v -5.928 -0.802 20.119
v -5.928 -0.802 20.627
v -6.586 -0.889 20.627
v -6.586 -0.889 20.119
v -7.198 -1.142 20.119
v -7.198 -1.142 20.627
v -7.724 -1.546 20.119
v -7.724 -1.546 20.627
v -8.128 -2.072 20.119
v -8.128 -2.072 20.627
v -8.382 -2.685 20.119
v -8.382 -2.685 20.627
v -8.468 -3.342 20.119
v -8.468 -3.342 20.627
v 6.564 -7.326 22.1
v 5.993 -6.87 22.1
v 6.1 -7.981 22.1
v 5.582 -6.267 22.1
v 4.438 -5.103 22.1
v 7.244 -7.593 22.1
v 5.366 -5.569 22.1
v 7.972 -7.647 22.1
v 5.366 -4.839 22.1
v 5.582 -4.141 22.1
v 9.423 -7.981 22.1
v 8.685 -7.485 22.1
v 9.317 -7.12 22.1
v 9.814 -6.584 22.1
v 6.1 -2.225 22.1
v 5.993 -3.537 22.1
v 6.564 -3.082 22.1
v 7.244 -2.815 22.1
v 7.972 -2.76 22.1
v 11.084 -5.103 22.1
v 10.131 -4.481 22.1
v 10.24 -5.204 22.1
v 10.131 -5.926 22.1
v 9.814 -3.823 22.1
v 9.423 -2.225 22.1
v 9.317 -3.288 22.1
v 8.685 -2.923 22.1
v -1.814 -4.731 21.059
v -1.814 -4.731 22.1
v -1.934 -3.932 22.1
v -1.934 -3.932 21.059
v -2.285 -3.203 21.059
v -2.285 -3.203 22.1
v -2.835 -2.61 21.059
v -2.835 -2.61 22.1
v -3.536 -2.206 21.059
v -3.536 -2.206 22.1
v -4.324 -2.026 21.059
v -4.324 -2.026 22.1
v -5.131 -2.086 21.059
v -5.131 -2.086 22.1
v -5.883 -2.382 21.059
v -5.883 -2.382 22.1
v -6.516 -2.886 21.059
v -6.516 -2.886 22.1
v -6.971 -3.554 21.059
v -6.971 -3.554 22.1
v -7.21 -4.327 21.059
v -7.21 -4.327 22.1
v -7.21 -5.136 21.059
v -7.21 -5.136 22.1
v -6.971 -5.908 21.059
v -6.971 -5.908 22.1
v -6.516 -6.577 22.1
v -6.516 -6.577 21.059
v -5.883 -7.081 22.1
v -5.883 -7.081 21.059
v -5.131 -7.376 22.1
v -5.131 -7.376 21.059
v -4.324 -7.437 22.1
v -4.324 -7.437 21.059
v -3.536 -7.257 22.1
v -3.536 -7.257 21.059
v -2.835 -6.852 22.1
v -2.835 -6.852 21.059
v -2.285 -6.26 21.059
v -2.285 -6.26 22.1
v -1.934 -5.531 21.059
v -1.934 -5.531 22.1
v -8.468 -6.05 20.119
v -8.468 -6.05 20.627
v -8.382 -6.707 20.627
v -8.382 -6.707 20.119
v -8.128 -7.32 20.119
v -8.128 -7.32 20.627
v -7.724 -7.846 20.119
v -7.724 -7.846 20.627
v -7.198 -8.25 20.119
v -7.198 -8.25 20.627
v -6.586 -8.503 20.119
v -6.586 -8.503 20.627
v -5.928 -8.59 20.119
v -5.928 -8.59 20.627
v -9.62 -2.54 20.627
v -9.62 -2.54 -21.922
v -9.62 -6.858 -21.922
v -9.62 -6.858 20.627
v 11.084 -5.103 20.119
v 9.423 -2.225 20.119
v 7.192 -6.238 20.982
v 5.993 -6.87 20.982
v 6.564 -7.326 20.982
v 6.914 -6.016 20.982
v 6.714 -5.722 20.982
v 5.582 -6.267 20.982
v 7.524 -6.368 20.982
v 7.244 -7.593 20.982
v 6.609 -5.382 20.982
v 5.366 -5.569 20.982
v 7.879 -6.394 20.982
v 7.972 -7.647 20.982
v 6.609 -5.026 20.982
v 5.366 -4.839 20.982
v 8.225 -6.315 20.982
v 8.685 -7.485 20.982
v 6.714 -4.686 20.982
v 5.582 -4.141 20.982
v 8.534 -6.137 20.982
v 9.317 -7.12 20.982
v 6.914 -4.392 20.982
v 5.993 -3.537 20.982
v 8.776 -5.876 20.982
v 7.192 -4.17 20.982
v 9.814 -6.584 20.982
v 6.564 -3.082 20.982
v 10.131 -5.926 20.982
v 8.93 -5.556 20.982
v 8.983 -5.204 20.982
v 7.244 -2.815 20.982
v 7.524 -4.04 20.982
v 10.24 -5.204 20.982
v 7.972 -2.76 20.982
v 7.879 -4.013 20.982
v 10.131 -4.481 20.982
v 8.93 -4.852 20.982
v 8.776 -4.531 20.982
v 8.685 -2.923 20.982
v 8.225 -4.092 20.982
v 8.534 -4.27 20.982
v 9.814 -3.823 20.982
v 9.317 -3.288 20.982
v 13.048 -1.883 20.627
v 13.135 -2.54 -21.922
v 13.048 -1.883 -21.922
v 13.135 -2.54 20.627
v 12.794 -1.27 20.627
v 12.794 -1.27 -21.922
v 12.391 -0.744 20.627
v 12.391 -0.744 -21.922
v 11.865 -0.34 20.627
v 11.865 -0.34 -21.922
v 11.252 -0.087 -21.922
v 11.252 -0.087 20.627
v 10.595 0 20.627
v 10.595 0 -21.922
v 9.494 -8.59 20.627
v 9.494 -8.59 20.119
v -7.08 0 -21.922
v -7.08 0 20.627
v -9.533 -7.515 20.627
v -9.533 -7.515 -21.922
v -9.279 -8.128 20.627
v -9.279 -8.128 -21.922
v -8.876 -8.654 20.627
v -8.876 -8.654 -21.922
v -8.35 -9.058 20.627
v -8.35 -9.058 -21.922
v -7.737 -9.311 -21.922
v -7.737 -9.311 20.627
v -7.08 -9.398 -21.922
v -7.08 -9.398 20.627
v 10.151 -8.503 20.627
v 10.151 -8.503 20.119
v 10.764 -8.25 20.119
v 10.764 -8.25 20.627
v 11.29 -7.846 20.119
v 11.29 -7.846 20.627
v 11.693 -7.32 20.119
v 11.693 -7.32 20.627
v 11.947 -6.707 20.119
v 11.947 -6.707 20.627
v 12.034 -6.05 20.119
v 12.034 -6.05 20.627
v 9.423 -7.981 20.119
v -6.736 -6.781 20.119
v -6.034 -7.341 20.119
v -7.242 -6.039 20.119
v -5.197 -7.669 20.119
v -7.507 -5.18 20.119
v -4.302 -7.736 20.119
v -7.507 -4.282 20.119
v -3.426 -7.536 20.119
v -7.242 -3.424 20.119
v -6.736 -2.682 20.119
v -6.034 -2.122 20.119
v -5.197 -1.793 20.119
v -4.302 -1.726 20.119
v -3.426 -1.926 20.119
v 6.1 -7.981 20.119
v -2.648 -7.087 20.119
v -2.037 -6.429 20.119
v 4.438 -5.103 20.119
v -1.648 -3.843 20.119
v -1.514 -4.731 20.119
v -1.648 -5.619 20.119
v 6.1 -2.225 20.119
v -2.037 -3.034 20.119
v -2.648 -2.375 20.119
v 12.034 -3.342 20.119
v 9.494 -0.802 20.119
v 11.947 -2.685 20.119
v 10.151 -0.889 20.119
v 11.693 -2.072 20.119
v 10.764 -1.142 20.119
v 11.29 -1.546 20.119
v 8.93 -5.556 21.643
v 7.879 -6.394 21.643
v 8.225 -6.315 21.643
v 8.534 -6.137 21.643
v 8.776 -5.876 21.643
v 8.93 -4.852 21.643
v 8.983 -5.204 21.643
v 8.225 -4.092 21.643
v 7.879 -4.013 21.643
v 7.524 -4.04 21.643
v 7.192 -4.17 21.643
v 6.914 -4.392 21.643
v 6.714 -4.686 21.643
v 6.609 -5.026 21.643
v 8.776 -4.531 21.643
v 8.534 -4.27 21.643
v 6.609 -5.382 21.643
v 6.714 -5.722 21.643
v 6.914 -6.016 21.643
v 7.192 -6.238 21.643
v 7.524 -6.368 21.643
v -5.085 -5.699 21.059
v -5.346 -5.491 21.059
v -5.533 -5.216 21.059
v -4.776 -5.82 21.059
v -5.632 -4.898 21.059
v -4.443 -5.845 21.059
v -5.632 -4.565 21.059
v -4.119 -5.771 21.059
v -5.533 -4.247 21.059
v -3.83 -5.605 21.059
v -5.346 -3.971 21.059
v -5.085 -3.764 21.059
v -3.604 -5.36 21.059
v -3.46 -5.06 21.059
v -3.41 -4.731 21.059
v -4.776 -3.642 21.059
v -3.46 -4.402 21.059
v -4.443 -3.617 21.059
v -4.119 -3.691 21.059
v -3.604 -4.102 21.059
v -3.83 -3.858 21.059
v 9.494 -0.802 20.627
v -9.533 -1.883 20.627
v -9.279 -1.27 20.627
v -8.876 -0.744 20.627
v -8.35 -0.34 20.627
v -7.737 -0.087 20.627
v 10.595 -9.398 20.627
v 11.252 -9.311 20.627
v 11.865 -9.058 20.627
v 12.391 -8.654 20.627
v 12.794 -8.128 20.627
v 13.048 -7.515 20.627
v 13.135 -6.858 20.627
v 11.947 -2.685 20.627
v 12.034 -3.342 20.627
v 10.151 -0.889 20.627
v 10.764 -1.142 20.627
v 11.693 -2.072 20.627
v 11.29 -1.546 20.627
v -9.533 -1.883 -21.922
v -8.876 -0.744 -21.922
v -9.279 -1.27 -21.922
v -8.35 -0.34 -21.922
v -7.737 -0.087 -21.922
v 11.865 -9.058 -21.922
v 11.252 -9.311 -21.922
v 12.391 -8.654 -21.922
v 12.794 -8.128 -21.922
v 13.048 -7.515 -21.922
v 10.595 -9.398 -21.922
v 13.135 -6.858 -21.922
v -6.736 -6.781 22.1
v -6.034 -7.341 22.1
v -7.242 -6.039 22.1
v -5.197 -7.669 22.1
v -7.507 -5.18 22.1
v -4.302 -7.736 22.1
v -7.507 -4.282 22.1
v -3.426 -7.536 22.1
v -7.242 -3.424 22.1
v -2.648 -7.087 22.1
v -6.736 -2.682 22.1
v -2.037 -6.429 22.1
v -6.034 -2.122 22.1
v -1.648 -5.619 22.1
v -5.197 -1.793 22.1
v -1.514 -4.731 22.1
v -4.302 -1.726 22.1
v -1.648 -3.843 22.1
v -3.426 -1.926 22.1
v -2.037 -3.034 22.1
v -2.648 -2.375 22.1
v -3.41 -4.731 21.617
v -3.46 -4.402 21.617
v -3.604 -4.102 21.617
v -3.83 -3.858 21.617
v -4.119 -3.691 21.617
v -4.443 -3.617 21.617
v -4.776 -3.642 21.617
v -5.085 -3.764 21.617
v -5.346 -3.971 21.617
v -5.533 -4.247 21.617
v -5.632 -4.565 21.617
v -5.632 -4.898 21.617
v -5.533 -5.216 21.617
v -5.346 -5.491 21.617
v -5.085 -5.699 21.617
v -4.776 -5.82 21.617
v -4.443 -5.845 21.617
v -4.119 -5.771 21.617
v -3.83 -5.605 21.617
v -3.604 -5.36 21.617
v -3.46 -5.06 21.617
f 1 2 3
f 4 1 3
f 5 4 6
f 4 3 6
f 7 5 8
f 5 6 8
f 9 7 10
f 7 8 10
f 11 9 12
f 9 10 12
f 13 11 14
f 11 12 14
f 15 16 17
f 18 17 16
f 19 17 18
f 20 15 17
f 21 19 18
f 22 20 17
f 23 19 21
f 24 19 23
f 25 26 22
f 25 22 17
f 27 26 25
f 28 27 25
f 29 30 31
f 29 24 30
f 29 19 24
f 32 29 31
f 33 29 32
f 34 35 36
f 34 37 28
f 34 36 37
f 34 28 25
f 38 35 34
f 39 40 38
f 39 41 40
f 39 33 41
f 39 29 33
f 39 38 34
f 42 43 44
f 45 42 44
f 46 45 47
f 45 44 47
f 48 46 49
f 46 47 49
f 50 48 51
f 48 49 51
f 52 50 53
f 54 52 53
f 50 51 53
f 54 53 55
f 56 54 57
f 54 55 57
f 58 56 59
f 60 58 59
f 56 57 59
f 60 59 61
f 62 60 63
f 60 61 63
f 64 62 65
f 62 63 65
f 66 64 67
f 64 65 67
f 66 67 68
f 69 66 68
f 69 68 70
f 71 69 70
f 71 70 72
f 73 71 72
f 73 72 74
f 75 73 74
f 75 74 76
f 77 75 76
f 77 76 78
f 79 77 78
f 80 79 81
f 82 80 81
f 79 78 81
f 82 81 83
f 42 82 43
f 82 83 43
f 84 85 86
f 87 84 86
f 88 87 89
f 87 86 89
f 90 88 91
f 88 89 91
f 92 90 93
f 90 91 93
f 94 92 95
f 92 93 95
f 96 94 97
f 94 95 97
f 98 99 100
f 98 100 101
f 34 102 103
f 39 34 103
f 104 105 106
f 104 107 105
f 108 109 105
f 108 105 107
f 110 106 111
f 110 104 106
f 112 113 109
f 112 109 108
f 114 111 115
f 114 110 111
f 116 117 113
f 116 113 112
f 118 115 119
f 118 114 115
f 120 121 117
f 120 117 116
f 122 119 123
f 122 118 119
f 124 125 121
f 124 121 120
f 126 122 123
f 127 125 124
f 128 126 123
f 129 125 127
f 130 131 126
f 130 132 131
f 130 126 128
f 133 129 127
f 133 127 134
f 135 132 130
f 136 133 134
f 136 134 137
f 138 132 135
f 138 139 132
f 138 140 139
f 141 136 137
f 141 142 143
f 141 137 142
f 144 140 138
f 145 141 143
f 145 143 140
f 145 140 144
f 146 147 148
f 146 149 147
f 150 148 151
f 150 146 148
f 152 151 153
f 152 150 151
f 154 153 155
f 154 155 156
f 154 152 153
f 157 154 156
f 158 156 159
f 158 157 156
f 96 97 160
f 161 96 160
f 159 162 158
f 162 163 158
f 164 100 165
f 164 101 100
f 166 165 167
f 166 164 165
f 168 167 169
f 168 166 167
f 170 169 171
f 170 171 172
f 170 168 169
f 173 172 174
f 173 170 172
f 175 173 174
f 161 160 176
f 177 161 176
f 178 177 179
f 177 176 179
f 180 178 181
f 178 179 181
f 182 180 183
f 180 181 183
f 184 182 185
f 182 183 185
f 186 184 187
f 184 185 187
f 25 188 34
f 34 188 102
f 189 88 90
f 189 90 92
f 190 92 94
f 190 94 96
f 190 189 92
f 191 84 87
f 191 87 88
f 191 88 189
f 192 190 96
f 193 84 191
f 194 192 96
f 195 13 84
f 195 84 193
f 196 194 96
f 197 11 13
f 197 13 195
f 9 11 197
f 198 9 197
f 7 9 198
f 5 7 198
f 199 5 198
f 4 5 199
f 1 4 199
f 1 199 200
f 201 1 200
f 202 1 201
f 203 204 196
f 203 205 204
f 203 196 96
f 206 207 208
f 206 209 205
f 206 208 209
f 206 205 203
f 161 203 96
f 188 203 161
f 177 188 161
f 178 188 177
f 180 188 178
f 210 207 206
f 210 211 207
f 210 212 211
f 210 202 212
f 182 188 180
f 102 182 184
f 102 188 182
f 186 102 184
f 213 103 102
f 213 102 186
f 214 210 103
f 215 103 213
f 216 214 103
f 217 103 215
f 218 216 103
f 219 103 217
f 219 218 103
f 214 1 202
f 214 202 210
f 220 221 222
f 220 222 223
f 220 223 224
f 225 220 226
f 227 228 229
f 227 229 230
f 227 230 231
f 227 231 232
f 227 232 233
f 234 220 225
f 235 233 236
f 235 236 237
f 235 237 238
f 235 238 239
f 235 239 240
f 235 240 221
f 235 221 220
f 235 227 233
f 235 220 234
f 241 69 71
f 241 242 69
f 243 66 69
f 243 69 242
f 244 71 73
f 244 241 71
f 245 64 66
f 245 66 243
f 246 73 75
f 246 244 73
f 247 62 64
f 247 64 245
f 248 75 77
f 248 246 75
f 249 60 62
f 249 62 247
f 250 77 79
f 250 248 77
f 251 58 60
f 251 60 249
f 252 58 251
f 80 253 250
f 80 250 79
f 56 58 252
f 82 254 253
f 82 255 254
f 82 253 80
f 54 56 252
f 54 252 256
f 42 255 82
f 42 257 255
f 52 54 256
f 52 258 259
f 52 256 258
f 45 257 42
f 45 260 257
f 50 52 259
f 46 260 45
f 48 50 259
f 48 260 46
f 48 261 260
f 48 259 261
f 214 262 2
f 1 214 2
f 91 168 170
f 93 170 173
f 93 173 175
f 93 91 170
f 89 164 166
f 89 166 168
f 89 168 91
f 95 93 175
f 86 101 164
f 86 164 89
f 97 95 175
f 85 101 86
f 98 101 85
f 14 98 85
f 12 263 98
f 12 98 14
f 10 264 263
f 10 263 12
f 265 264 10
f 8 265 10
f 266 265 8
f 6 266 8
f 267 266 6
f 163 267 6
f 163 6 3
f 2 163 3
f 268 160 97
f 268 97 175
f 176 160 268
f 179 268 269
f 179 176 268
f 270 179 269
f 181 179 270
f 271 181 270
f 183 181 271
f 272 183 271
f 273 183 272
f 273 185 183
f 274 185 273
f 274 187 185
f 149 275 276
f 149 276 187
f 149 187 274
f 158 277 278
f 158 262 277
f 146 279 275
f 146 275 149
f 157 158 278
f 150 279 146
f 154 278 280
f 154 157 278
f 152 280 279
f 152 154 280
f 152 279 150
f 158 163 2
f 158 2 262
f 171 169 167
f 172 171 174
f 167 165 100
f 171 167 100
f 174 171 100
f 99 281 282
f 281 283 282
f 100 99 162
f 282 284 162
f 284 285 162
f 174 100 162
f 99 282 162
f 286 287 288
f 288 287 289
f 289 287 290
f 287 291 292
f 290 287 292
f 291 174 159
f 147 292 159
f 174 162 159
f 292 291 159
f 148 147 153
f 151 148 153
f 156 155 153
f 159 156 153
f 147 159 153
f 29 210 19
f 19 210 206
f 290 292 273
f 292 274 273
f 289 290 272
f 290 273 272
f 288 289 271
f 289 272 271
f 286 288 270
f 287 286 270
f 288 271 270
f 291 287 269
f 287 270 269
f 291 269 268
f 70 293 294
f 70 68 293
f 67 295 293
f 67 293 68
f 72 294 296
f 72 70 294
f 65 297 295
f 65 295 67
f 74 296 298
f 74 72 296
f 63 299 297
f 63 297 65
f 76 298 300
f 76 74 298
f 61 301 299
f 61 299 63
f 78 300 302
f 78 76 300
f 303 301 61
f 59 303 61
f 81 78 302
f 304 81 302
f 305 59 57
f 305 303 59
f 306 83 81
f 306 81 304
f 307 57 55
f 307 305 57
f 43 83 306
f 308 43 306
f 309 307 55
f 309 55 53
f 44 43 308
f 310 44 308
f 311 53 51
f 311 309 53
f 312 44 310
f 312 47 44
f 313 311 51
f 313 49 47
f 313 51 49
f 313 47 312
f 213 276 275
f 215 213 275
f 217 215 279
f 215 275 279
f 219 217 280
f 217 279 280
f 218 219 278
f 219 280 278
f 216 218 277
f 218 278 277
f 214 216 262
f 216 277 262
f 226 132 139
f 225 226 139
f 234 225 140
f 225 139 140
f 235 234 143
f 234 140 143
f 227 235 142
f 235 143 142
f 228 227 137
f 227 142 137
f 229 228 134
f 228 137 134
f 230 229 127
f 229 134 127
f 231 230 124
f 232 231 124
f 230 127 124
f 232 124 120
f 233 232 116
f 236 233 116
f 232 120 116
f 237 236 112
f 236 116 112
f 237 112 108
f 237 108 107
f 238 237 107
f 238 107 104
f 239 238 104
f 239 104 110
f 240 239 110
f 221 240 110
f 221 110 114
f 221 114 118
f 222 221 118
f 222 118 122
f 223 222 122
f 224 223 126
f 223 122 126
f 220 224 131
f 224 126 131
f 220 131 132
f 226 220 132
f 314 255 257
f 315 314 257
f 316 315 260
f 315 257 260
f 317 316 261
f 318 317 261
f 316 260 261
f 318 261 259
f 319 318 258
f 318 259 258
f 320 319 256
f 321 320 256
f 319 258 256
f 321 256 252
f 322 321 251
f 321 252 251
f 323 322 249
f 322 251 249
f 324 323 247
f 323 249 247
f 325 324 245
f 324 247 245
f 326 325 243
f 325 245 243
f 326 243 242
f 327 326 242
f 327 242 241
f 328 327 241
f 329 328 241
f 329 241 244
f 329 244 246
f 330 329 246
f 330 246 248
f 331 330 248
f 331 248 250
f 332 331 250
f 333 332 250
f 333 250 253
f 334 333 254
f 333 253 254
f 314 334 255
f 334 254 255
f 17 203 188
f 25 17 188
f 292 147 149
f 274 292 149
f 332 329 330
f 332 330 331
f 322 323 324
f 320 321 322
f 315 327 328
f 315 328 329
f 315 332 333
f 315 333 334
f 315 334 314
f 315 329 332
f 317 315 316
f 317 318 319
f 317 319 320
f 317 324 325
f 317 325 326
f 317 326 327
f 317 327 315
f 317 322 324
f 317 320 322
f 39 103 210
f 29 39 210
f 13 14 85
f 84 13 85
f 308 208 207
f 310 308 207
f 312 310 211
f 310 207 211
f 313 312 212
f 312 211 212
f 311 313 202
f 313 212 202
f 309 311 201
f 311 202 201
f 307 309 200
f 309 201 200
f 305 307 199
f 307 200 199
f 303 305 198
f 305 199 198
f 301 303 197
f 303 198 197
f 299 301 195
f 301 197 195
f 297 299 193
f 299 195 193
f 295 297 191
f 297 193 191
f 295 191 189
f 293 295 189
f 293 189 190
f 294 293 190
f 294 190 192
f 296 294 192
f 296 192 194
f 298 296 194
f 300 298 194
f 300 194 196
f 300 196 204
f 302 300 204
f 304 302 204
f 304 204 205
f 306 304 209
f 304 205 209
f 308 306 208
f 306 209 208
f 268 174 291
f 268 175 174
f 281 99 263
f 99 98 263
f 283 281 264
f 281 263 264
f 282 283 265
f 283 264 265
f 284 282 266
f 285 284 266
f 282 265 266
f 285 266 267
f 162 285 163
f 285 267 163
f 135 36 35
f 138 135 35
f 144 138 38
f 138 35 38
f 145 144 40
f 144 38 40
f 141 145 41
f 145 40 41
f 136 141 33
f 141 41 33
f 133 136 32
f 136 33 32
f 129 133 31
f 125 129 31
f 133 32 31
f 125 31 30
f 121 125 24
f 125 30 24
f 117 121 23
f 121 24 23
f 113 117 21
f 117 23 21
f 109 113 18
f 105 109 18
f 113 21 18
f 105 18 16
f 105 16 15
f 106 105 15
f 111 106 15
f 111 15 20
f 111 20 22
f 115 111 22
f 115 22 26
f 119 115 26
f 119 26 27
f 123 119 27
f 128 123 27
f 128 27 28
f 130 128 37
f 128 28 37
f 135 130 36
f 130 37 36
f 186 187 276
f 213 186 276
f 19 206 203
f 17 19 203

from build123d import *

# Parameters (mm, degrees)
F0_W      = 22.75429
F0_H      = 42.548669
F1_DEPTH  = 9.398
F2_R      = 2.54
F4_DEPTH  = 0.508
F6_DEPTH  = 1.9812
F7_R      = 3.013325
F8_DEPTH  = 1.9812
F9_R      = 2.713026
F10_DEPTH = 1.0414
F11_R     = 1.117074
F12_DEPTH = 0.5588
F13_R     = 2.450394
F14_DEPTH = 1.1176
F15_R     = 1.193925
F16_DEPTH = 0.6604


with BuildPart() as f1:
    # F0 (on Front) → F1 (new body)
    with BuildSketch(Plane.XZ):
        with Locations((1.757446, -0.647479)):
            Rectangle(F0_W, F0_H)
    extrude(amount=F1_DEPTH)

    # F2
    f2_edges = [f1.edges().sort_by_distance(p)[0] for p in [
        (13.134591, -9.398, -0.647479),
        (-9.619699, -9.398, -0.647479),
        (13.134591, 0, -0.647479),
        (-9.619699, 0, -0.647479),
    ]]
    fillet(f2_edges, radius=F2_R)

    # F3 (on face) → F4 (cut)
    with BuildSketch(Plane.XY.offset(20.626856)):
        with BuildLine():
            Line((9.49368, -0.802048), (-5.928423, -0.802048))
            ThreePointArc((-5.928423, -0.802048), (-7.724474, -1.545997), (-8.468423, -3.342048))
            Line((-8.468423, -3.342048), (-8.468423, -6.049972))
            ThreePointArc((-8.468423, -6.049972), (-7.724474, -7.846024), (-5.928423, -8.589972))
            Line((-5.928423, -8.589972), (9.49368, -8.589972))
            ThreePointArc((9.49368, -8.589972), (11.289732, -7.846024), (12.03368, -6.049972))
            Line((12.03368, -6.049972), (12.03368, -3.342048))
            ThreePointArc((12.03368, -3.342048), (11.289732, -1.545997), (9.49368, -0.802048))
        make_face()
    extrude(amount=-F4_DEPTH, mode=Mode.SUBTRACT)

    # F5 (on face) → F6 (join)
    with BuildSketch(Plane.XY.offset(20.118856)):
        Polygon((9.422873, -2.225276), (6.099785, -2.225276), (4.438241, -5.103154), (6.099785, -7.981033), (9.422873, -7.981033), (11.084417, -5.103154), align=None)
    extrude(amount=F6_DEPTH)

    # F7 (on face) → F8 (join)
    with BuildSketch(Plane.XY.offset(20.118856)):
        with Locations((-4.526955, -4.731211)):
            Circle(F7_R)
    extrude(amount=F8_DEPTH)

    # F9 (on face) → F10 (cut)
    with BuildSketch(Plane.XY.offset(22.100056)):
        with Locations((-4.526955, -4.731211)):
            Circle(F9_R)
    extrude(amount=-F10_DEPTH, mode=Mode.SUBTRACT)

    # F11 (on face) → F12 (join)
    with BuildSketch(Plane.XY.offset(21.058656)):
        with Locations((-4.526955, -4.731211)):
            Circle(F11_R)
    extrude(amount=F12_DEPTH)

    # F13 (on face) → F14 (cut)
    with BuildSketch(Plane.XY.offset(22.100056)):
        with Locations((7.78931, -5.203744)):
            Circle(F13_R)
    extrude(amount=-F14_DEPTH, mode=Mode.SUBTRACT)

    # F15 (on face) → F16 (join)
    with BuildSketch(Plane.XY.offset(20.982456)):
        with Locations((7.78931, -5.203744)):
            Circle(F15_R)
    extrude(amount=F16_DEPTH)


solid = f1.part
